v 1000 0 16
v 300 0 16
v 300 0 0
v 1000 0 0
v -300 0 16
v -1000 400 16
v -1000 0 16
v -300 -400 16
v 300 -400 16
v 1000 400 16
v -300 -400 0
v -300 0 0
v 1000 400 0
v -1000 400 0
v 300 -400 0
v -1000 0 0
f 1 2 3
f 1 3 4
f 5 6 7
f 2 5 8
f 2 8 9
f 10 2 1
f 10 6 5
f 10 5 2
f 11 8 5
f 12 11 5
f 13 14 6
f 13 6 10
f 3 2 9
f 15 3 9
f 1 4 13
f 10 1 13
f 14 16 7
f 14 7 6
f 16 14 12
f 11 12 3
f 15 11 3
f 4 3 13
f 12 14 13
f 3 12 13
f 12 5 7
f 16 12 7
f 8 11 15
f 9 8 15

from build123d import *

# Parameters (mm, degrees)
SKIZZE1_W                       = 2000
SKIZZE1_H                       = 800
AUFSATZ_LINEAR_AUSTRAGEN1_DEPTH = 16
SCHNITT_LINEAR_AUSTRAGEN1_DEPTH = 17


with BuildPart() as part:
    # Skizze1 → Aufsatz-Linear austragen1 (new body)
    with BuildSketch(Plane.XY):
        Rectangle(SKIZZE1_W, SKIZZE1_H)
    extrude(amount=AUFSATZ_LINEAR_AUSTRAGEN1_DEPTH)

    # Skizze2 → Schnitt-Linear austragen1 (cut, through all)
    with BuildSketch(Plane.XY.offset(16)):
        Polygon((-300, -400), (-300, 0), (-1381.908908696, 0), (-1381.908908696, -457.580605906), (-300, -457.580605906), align=None)
        Polygon((1381.908908696, -457.580605906), (300, -457.580605906), (300, -400), (300, 0), (1381.908908696, 0), align=None)
    extrude(amount=-SCHNITT_LINEAR_AUSTRAGEN1_DEPTH, mode=Mode.SUBTRACT)


solid = part.part
